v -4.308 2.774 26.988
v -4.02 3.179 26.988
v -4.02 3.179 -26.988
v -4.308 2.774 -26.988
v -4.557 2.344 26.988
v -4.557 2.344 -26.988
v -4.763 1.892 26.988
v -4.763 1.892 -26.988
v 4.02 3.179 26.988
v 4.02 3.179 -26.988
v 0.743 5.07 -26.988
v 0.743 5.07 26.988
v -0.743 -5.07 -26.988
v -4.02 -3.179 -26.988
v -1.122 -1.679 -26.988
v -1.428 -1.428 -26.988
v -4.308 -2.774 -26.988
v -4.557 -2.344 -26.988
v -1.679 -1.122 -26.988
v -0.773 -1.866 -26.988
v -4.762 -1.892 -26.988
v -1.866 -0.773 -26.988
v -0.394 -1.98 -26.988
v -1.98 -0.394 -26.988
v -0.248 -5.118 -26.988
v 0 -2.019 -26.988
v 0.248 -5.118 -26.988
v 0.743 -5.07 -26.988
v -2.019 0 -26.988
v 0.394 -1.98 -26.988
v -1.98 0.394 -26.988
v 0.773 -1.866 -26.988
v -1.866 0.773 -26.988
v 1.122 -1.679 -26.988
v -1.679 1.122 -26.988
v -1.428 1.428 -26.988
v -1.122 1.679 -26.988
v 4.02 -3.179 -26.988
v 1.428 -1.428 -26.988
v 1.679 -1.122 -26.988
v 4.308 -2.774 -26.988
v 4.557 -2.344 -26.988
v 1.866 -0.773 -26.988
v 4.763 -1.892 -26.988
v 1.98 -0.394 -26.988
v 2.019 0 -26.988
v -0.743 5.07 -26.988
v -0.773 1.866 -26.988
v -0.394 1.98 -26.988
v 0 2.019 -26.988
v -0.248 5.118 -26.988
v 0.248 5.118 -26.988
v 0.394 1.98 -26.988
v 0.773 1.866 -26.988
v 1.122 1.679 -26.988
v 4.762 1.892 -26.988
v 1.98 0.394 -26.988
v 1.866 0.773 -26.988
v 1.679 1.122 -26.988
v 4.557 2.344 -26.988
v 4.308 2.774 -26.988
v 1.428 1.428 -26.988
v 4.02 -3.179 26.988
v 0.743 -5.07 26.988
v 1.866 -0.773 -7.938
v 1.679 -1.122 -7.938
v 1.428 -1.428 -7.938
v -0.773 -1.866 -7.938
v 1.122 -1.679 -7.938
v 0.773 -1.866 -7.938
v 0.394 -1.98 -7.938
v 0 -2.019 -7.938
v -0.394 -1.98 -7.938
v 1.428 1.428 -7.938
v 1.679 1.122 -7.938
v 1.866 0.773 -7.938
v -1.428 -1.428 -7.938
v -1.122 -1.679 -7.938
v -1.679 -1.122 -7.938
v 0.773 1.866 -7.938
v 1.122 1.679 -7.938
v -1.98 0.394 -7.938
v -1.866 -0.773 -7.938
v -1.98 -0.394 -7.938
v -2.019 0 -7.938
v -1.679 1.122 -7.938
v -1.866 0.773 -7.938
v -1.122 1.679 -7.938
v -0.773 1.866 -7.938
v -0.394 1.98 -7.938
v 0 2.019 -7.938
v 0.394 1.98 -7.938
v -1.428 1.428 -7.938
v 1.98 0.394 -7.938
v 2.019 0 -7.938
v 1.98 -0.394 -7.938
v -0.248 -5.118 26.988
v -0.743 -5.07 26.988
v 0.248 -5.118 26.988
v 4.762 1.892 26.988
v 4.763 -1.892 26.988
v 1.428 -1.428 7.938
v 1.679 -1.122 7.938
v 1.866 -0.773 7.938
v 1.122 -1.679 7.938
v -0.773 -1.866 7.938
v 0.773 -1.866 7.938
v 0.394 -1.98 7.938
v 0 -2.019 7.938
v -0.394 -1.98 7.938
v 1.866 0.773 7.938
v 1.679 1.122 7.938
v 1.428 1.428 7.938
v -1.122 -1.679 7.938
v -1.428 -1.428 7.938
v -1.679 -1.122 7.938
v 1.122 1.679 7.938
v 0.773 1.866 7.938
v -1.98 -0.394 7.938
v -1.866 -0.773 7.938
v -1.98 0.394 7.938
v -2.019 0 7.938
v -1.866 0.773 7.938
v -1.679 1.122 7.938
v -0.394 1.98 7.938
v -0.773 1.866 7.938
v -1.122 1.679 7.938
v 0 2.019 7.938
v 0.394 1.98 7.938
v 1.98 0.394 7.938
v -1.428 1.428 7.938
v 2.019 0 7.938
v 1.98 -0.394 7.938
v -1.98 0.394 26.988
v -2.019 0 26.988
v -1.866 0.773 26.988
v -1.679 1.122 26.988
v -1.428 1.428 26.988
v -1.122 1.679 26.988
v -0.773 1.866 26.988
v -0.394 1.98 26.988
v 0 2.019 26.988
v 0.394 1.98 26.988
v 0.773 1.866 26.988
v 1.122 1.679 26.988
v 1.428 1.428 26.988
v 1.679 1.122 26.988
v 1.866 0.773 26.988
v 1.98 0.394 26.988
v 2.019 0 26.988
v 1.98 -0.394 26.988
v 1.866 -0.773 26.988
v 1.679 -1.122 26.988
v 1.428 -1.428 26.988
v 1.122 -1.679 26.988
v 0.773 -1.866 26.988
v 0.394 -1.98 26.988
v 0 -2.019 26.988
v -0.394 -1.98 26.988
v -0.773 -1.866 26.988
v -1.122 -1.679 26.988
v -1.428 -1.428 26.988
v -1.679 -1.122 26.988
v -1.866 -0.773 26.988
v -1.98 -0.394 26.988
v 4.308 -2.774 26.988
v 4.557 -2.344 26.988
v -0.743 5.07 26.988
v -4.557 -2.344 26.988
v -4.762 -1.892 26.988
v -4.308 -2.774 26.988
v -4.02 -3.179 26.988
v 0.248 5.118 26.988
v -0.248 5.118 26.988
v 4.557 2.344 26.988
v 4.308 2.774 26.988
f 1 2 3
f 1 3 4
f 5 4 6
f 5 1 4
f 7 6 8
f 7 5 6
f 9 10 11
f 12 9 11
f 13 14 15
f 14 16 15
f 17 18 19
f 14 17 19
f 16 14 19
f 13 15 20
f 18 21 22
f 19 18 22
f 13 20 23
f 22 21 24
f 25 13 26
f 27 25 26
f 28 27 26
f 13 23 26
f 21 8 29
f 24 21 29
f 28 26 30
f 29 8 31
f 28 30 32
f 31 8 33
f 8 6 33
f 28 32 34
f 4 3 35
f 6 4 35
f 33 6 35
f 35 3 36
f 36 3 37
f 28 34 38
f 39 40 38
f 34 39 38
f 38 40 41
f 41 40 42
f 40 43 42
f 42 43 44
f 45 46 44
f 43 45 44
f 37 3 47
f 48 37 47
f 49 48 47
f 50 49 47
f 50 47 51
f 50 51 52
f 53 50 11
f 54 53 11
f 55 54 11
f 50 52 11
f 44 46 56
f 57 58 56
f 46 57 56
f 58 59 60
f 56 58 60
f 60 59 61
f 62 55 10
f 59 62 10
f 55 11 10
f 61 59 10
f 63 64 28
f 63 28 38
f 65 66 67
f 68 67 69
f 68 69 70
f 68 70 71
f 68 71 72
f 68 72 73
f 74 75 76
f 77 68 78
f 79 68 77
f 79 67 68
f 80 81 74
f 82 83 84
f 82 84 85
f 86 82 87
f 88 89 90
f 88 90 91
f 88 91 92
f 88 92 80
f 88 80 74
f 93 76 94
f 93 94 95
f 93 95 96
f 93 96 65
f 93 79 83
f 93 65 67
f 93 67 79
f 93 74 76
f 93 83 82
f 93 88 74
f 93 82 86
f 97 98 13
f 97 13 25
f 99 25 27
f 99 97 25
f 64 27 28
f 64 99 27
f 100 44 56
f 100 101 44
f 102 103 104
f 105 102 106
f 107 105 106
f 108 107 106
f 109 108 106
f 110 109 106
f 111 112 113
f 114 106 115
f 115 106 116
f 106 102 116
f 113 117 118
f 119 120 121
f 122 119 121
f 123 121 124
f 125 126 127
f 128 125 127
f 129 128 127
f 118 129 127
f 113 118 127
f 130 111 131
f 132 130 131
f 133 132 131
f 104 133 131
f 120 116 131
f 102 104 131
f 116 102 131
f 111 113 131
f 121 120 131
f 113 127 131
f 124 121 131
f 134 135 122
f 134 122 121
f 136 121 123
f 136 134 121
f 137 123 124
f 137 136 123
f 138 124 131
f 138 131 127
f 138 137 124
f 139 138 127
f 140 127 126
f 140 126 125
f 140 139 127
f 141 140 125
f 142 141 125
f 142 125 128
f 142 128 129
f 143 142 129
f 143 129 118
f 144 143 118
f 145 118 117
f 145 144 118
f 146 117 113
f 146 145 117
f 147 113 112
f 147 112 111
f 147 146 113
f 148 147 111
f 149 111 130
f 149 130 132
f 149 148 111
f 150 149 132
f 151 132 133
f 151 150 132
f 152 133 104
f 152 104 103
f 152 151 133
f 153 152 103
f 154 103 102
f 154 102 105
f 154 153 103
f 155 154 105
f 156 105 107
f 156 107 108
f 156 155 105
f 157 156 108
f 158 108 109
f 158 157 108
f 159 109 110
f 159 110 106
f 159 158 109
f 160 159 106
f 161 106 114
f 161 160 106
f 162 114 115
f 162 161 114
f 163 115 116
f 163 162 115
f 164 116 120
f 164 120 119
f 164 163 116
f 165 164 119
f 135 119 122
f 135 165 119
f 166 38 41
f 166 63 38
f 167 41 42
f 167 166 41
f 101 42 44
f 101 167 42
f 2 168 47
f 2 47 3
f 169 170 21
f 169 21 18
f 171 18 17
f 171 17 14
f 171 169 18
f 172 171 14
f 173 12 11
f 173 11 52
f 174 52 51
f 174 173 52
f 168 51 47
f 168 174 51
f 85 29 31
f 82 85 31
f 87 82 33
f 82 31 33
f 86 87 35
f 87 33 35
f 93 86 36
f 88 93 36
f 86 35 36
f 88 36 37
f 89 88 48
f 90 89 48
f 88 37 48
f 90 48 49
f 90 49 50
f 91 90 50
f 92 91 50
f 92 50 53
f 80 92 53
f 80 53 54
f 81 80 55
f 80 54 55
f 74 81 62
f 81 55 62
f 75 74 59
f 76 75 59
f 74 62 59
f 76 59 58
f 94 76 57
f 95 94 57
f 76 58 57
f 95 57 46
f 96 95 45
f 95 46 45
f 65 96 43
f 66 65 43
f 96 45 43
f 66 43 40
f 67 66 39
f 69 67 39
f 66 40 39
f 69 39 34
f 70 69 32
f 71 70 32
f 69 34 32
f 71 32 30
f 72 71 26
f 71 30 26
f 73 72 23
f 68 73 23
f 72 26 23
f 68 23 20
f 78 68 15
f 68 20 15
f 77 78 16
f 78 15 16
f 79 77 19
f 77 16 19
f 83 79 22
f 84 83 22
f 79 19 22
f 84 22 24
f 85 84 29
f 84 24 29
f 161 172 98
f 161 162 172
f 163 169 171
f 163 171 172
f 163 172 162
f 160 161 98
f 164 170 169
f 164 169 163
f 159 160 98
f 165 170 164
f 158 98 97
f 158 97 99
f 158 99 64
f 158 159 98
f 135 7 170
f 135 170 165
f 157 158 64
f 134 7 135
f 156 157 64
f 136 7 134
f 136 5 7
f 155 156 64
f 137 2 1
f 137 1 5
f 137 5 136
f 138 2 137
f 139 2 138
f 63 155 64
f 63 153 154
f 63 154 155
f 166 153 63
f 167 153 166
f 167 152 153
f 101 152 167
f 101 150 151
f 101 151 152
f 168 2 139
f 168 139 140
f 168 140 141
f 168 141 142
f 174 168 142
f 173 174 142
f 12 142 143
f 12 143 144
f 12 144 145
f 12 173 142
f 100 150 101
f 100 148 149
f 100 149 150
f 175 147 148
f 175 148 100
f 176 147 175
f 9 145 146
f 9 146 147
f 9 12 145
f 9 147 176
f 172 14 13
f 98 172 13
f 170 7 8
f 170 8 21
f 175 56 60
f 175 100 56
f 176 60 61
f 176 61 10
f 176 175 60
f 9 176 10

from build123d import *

# Parameters (mm, degrees)
BOSS_EXTRUDE1_DEPTH = 26.9875
SKETCH2_R           = 2.0193
CUT_EXTRUDE1_DEPTH  = 19.05


with BuildPart() as part:
    # Sketch1 → Boss-Extrude1 (new, symmetric)
    with BuildSketch(Plane.XY):
        with BuildLine():
            ThreePointArc((4.7625, 1.891713919), (4.43790388, 2.562225), (4.019522311, 3.178589026))
            Line((4.019522311, 3.178589026), (0.742977689, 5.070302945))
            ThreePointArc((0.742977689, 5.070302945), (0, 5.12445), (-0.742977689, 5.070302945))
            Line((-0.742977689, 5.070302945), (-4.019522311, 3.178589026))
            ThreePointArc((-4.019522311, 3.178589026), (-4.43790388, 2.562225), (-4.7625, 1.891713919))
            Line((-4.7625, 1.891713919), (-4.7625, -1.891713919))
            ThreePointArc((-4.7625, -1.891713919), (-4.43790388, -2.562225), (-4.019522311, -3.178589026))
            Line((-4.019522311, -3.178589026), (-0.742977689, -5.070302945))
            ThreePointArc((-0.742977689, -5.070302945), (0, -5.12445), (0.742977689, -5.070302945))
            Line((0.742977689, -5.070302945), (4.019522311, -3.178589026))
            ThreePointArc((4.019522311, -3.178589026), (4.43790388, -2.562225), (4.7625, -1.891713919))
            Line((4.7625, -1.891713919), (4.7625, 1.891713919))
        make_face()
    extrude(amount=BOSS_EXTRUDE1_DEPTH, both=True)

    # Sketch2 → Cut-Extrude1 (cut)
    with BuildSketch(Plane(origin=(0, 0, -26.9875), x_dir=(-1, 0, 0), z_dir=(0, 0, -1))):
        Circle(SKETCH2_R)
    cut_extrude1 = extrude(amount=-CUT_EXTRUDE1_DEPTH, mode=Mode.SUBTRACT)

    # Mirror1: Cut-Extrude1 across plane
    add(cut_extrude1.mirror(Plane.XY), mode=Mode.SUBTRACT)


solid = part.part
